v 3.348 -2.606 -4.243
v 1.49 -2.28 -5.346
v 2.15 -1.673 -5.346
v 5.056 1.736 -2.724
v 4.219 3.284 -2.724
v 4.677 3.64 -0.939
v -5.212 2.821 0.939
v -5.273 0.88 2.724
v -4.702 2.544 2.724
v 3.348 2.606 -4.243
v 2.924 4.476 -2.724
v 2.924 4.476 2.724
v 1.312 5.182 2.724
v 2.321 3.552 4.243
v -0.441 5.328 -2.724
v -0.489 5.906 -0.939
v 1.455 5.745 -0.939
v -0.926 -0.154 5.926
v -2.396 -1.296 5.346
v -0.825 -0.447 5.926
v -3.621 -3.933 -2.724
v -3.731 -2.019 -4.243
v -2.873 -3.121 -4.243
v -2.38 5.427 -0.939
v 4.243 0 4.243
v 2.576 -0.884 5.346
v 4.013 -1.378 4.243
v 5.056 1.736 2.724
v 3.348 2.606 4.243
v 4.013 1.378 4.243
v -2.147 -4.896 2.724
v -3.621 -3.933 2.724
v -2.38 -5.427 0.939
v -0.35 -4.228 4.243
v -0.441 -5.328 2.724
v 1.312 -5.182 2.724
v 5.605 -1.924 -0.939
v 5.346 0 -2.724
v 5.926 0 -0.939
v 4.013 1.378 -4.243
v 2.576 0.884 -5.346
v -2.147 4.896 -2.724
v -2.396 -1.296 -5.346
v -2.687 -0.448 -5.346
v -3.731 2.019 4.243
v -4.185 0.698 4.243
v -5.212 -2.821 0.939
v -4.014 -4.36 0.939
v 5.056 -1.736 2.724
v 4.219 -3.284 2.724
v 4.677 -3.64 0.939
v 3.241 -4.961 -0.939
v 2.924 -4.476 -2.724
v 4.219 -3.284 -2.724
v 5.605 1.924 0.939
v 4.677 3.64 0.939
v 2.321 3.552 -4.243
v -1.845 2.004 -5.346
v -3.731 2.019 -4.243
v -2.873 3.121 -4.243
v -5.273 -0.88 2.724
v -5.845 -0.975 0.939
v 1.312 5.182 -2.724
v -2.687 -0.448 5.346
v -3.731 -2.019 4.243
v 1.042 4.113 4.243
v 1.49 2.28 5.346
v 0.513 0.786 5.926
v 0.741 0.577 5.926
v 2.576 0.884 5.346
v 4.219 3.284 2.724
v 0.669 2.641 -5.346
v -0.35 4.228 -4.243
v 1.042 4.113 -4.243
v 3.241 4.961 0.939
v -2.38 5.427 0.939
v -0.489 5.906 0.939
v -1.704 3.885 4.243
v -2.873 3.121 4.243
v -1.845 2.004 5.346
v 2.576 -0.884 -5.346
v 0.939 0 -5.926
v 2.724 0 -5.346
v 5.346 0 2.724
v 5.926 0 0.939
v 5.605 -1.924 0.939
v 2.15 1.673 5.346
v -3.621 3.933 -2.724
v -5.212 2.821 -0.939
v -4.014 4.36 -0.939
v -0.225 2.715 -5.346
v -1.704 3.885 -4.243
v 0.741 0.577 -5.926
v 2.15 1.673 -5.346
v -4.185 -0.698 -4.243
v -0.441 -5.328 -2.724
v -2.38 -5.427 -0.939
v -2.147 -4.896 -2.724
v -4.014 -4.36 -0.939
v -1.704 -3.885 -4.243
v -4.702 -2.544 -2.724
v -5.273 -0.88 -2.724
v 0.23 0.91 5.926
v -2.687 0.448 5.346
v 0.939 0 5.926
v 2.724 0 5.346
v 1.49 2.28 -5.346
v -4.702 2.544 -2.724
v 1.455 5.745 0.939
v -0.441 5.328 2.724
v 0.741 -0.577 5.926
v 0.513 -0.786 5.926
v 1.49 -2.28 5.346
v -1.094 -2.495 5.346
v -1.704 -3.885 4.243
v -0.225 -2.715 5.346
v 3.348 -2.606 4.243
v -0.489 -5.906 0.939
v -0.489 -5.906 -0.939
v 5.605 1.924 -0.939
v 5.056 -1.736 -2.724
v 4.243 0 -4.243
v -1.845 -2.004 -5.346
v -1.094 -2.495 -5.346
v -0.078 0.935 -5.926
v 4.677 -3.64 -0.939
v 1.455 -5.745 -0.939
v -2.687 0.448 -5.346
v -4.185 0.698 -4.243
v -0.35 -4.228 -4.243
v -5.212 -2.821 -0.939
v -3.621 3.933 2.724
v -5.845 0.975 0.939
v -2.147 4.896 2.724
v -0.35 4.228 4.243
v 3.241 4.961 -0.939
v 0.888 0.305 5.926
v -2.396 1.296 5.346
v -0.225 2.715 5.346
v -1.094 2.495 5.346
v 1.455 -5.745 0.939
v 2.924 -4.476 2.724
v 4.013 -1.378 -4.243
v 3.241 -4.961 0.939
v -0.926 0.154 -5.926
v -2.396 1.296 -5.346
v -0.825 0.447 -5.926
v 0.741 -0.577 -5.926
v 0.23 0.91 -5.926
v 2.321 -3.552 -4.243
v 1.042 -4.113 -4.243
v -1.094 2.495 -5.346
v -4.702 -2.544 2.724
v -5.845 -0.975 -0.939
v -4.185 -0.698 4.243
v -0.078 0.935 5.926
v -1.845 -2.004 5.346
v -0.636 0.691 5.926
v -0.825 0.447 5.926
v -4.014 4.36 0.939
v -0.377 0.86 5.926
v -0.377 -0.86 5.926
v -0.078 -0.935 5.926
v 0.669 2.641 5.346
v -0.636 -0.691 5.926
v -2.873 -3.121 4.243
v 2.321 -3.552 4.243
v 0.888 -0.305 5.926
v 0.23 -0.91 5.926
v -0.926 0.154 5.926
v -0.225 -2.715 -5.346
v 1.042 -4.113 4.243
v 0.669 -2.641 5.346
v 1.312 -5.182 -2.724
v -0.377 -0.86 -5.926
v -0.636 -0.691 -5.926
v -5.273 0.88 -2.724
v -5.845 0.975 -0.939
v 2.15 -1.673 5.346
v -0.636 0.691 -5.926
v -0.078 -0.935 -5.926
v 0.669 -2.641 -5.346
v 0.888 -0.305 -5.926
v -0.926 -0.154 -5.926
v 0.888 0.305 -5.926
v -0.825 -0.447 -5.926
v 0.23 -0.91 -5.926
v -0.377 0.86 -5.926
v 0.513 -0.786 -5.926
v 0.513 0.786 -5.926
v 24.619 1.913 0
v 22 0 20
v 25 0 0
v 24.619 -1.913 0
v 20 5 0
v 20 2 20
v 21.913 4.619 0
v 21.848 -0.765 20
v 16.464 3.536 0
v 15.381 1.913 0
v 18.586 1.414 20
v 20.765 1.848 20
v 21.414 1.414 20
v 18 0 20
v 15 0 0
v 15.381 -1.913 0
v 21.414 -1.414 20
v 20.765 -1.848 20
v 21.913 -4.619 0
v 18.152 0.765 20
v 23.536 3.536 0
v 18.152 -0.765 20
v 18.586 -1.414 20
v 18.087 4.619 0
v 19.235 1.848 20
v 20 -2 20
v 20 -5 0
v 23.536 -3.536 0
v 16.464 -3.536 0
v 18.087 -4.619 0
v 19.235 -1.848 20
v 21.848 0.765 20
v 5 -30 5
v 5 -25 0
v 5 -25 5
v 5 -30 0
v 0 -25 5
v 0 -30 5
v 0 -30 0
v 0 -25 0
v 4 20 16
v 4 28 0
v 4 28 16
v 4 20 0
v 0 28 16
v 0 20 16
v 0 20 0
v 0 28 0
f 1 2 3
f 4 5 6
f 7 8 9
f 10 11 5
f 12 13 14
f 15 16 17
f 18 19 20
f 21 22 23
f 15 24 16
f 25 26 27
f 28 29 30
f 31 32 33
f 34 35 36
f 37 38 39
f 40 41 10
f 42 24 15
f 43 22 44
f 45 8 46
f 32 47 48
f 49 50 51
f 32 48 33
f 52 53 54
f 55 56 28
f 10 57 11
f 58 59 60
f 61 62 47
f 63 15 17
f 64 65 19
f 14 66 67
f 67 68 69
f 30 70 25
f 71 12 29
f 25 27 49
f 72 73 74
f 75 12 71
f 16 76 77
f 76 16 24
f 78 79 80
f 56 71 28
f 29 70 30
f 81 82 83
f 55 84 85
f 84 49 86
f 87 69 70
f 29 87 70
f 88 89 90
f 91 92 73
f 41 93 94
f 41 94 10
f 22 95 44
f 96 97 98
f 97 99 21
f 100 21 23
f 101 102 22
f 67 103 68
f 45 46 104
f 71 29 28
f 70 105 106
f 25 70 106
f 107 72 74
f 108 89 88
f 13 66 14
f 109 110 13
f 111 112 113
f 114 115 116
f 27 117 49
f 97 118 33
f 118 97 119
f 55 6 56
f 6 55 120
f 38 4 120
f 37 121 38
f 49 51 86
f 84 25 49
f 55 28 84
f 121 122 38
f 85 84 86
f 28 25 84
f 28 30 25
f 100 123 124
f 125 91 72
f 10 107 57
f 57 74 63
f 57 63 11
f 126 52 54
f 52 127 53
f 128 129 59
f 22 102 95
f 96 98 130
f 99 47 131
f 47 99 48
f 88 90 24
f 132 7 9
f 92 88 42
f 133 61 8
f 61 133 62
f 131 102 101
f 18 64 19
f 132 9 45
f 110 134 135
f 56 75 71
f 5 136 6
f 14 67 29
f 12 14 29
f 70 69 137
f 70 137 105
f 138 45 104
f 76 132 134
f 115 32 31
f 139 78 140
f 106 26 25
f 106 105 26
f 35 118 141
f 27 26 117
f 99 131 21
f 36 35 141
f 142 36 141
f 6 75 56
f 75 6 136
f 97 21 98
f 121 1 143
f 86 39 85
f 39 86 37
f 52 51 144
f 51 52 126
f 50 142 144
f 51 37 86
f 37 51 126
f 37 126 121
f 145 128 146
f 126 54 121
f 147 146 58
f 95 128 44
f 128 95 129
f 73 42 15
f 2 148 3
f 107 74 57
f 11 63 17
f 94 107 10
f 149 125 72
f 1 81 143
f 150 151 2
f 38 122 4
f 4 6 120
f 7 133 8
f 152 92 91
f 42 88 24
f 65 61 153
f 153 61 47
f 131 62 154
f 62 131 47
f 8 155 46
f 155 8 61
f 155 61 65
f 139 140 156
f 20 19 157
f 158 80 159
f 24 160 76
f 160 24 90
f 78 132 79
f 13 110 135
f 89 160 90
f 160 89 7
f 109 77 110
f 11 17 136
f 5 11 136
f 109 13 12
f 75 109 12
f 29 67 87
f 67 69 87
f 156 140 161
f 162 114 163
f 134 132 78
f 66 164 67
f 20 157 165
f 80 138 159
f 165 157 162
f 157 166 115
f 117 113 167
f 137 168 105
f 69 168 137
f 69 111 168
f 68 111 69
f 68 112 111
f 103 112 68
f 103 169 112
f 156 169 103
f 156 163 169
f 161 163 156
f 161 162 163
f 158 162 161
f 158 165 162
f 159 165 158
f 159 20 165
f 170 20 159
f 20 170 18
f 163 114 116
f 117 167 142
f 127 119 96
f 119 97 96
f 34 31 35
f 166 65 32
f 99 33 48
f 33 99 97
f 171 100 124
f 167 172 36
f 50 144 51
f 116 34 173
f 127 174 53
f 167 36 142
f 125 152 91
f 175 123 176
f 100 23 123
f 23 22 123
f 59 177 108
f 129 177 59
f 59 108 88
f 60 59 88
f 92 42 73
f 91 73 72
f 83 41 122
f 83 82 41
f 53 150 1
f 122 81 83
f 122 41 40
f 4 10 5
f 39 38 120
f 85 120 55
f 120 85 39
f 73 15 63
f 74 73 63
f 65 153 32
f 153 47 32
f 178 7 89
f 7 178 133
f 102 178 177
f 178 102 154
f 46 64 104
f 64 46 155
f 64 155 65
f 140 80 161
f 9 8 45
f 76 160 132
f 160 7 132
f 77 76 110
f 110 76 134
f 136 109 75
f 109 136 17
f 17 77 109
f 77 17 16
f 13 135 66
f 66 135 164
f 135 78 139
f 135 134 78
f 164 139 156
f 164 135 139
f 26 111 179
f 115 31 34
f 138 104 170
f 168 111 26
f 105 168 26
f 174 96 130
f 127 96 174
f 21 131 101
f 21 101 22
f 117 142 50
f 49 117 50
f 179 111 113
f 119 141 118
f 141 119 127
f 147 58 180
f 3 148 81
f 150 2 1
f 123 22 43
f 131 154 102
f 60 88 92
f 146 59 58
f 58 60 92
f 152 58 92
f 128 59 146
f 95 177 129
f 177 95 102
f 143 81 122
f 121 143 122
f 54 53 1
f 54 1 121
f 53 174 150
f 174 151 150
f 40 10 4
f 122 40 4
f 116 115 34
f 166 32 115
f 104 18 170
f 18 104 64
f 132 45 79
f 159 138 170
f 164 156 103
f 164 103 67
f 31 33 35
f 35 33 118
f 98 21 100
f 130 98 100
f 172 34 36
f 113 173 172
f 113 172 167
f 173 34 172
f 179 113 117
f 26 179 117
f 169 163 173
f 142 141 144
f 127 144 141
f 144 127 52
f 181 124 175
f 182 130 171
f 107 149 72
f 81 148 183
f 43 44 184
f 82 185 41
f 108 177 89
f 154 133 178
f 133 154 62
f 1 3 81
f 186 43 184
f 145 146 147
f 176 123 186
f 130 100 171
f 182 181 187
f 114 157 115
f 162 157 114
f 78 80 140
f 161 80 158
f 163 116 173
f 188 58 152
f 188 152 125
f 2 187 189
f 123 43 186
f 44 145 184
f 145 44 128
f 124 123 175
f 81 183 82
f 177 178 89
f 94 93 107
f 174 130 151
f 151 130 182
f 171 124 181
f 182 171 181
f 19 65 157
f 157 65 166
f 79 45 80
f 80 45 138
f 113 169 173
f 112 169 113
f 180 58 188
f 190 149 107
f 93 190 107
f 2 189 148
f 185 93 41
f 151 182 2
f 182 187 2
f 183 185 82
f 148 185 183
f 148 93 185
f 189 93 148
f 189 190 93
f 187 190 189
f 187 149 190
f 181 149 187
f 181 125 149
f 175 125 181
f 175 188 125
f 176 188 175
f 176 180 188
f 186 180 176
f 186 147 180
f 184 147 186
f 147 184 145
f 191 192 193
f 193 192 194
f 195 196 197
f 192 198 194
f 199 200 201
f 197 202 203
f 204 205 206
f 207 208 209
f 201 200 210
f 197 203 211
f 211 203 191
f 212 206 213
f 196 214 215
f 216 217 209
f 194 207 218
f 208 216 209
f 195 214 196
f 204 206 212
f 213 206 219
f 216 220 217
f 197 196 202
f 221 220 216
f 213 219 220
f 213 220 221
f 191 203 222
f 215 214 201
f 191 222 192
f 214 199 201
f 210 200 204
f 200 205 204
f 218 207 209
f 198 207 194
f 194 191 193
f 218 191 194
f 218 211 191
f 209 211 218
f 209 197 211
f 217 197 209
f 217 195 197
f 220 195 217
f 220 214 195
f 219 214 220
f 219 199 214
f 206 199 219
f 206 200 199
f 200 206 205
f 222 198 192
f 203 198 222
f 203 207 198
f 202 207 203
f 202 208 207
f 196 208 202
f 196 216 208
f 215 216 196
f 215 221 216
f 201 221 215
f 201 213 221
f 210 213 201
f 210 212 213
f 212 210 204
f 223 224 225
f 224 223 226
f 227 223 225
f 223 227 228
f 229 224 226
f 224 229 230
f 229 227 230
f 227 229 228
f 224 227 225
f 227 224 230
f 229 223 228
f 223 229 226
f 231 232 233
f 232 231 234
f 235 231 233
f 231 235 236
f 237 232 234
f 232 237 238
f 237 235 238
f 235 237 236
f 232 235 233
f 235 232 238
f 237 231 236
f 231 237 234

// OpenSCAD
sphere(r=6);

translate([20, 0, 0])
cylinder(h=20, r1=5, r2=2);

translate([0, -30, 0])
cube(5);

translate([0, 20, 0])
cube([4, 8, 16]);
